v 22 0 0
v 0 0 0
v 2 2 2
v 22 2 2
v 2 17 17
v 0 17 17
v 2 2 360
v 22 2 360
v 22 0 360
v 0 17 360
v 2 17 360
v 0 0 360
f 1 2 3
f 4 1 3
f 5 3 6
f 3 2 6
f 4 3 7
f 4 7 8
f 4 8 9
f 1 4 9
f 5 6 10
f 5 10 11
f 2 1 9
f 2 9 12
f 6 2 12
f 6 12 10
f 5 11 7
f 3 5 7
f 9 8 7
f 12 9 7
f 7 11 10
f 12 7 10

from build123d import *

# Parameters (mm, degrees)
BOSS_EXTRUDE1_DEPTH = 360
CUT_EXTRUDE1_DEPTH  = 360


with BuildPart() as part:
    # Sketch2 → Boss-Extrude1 (new body)
    with BuildSketch(Plane.XY):
        Polygon((0, 0), (0, 17), (2, 17), (2, 2), (22, 2), (22, 0), align=None)
    extrude(amount=BOSS_EXTRUDE1_DEPTH)

    # Sketch3 → Cut-Extrude1 (cut)
    with BuildSketch(Plane.ZY):
        Polygon((0, 0), (17, 17), (0, 17), align=None)
    extrude(amount=-CUT_EXTRUDE1_DEPTH, mode=Mode.SUBTRACT)


solid = part.part
